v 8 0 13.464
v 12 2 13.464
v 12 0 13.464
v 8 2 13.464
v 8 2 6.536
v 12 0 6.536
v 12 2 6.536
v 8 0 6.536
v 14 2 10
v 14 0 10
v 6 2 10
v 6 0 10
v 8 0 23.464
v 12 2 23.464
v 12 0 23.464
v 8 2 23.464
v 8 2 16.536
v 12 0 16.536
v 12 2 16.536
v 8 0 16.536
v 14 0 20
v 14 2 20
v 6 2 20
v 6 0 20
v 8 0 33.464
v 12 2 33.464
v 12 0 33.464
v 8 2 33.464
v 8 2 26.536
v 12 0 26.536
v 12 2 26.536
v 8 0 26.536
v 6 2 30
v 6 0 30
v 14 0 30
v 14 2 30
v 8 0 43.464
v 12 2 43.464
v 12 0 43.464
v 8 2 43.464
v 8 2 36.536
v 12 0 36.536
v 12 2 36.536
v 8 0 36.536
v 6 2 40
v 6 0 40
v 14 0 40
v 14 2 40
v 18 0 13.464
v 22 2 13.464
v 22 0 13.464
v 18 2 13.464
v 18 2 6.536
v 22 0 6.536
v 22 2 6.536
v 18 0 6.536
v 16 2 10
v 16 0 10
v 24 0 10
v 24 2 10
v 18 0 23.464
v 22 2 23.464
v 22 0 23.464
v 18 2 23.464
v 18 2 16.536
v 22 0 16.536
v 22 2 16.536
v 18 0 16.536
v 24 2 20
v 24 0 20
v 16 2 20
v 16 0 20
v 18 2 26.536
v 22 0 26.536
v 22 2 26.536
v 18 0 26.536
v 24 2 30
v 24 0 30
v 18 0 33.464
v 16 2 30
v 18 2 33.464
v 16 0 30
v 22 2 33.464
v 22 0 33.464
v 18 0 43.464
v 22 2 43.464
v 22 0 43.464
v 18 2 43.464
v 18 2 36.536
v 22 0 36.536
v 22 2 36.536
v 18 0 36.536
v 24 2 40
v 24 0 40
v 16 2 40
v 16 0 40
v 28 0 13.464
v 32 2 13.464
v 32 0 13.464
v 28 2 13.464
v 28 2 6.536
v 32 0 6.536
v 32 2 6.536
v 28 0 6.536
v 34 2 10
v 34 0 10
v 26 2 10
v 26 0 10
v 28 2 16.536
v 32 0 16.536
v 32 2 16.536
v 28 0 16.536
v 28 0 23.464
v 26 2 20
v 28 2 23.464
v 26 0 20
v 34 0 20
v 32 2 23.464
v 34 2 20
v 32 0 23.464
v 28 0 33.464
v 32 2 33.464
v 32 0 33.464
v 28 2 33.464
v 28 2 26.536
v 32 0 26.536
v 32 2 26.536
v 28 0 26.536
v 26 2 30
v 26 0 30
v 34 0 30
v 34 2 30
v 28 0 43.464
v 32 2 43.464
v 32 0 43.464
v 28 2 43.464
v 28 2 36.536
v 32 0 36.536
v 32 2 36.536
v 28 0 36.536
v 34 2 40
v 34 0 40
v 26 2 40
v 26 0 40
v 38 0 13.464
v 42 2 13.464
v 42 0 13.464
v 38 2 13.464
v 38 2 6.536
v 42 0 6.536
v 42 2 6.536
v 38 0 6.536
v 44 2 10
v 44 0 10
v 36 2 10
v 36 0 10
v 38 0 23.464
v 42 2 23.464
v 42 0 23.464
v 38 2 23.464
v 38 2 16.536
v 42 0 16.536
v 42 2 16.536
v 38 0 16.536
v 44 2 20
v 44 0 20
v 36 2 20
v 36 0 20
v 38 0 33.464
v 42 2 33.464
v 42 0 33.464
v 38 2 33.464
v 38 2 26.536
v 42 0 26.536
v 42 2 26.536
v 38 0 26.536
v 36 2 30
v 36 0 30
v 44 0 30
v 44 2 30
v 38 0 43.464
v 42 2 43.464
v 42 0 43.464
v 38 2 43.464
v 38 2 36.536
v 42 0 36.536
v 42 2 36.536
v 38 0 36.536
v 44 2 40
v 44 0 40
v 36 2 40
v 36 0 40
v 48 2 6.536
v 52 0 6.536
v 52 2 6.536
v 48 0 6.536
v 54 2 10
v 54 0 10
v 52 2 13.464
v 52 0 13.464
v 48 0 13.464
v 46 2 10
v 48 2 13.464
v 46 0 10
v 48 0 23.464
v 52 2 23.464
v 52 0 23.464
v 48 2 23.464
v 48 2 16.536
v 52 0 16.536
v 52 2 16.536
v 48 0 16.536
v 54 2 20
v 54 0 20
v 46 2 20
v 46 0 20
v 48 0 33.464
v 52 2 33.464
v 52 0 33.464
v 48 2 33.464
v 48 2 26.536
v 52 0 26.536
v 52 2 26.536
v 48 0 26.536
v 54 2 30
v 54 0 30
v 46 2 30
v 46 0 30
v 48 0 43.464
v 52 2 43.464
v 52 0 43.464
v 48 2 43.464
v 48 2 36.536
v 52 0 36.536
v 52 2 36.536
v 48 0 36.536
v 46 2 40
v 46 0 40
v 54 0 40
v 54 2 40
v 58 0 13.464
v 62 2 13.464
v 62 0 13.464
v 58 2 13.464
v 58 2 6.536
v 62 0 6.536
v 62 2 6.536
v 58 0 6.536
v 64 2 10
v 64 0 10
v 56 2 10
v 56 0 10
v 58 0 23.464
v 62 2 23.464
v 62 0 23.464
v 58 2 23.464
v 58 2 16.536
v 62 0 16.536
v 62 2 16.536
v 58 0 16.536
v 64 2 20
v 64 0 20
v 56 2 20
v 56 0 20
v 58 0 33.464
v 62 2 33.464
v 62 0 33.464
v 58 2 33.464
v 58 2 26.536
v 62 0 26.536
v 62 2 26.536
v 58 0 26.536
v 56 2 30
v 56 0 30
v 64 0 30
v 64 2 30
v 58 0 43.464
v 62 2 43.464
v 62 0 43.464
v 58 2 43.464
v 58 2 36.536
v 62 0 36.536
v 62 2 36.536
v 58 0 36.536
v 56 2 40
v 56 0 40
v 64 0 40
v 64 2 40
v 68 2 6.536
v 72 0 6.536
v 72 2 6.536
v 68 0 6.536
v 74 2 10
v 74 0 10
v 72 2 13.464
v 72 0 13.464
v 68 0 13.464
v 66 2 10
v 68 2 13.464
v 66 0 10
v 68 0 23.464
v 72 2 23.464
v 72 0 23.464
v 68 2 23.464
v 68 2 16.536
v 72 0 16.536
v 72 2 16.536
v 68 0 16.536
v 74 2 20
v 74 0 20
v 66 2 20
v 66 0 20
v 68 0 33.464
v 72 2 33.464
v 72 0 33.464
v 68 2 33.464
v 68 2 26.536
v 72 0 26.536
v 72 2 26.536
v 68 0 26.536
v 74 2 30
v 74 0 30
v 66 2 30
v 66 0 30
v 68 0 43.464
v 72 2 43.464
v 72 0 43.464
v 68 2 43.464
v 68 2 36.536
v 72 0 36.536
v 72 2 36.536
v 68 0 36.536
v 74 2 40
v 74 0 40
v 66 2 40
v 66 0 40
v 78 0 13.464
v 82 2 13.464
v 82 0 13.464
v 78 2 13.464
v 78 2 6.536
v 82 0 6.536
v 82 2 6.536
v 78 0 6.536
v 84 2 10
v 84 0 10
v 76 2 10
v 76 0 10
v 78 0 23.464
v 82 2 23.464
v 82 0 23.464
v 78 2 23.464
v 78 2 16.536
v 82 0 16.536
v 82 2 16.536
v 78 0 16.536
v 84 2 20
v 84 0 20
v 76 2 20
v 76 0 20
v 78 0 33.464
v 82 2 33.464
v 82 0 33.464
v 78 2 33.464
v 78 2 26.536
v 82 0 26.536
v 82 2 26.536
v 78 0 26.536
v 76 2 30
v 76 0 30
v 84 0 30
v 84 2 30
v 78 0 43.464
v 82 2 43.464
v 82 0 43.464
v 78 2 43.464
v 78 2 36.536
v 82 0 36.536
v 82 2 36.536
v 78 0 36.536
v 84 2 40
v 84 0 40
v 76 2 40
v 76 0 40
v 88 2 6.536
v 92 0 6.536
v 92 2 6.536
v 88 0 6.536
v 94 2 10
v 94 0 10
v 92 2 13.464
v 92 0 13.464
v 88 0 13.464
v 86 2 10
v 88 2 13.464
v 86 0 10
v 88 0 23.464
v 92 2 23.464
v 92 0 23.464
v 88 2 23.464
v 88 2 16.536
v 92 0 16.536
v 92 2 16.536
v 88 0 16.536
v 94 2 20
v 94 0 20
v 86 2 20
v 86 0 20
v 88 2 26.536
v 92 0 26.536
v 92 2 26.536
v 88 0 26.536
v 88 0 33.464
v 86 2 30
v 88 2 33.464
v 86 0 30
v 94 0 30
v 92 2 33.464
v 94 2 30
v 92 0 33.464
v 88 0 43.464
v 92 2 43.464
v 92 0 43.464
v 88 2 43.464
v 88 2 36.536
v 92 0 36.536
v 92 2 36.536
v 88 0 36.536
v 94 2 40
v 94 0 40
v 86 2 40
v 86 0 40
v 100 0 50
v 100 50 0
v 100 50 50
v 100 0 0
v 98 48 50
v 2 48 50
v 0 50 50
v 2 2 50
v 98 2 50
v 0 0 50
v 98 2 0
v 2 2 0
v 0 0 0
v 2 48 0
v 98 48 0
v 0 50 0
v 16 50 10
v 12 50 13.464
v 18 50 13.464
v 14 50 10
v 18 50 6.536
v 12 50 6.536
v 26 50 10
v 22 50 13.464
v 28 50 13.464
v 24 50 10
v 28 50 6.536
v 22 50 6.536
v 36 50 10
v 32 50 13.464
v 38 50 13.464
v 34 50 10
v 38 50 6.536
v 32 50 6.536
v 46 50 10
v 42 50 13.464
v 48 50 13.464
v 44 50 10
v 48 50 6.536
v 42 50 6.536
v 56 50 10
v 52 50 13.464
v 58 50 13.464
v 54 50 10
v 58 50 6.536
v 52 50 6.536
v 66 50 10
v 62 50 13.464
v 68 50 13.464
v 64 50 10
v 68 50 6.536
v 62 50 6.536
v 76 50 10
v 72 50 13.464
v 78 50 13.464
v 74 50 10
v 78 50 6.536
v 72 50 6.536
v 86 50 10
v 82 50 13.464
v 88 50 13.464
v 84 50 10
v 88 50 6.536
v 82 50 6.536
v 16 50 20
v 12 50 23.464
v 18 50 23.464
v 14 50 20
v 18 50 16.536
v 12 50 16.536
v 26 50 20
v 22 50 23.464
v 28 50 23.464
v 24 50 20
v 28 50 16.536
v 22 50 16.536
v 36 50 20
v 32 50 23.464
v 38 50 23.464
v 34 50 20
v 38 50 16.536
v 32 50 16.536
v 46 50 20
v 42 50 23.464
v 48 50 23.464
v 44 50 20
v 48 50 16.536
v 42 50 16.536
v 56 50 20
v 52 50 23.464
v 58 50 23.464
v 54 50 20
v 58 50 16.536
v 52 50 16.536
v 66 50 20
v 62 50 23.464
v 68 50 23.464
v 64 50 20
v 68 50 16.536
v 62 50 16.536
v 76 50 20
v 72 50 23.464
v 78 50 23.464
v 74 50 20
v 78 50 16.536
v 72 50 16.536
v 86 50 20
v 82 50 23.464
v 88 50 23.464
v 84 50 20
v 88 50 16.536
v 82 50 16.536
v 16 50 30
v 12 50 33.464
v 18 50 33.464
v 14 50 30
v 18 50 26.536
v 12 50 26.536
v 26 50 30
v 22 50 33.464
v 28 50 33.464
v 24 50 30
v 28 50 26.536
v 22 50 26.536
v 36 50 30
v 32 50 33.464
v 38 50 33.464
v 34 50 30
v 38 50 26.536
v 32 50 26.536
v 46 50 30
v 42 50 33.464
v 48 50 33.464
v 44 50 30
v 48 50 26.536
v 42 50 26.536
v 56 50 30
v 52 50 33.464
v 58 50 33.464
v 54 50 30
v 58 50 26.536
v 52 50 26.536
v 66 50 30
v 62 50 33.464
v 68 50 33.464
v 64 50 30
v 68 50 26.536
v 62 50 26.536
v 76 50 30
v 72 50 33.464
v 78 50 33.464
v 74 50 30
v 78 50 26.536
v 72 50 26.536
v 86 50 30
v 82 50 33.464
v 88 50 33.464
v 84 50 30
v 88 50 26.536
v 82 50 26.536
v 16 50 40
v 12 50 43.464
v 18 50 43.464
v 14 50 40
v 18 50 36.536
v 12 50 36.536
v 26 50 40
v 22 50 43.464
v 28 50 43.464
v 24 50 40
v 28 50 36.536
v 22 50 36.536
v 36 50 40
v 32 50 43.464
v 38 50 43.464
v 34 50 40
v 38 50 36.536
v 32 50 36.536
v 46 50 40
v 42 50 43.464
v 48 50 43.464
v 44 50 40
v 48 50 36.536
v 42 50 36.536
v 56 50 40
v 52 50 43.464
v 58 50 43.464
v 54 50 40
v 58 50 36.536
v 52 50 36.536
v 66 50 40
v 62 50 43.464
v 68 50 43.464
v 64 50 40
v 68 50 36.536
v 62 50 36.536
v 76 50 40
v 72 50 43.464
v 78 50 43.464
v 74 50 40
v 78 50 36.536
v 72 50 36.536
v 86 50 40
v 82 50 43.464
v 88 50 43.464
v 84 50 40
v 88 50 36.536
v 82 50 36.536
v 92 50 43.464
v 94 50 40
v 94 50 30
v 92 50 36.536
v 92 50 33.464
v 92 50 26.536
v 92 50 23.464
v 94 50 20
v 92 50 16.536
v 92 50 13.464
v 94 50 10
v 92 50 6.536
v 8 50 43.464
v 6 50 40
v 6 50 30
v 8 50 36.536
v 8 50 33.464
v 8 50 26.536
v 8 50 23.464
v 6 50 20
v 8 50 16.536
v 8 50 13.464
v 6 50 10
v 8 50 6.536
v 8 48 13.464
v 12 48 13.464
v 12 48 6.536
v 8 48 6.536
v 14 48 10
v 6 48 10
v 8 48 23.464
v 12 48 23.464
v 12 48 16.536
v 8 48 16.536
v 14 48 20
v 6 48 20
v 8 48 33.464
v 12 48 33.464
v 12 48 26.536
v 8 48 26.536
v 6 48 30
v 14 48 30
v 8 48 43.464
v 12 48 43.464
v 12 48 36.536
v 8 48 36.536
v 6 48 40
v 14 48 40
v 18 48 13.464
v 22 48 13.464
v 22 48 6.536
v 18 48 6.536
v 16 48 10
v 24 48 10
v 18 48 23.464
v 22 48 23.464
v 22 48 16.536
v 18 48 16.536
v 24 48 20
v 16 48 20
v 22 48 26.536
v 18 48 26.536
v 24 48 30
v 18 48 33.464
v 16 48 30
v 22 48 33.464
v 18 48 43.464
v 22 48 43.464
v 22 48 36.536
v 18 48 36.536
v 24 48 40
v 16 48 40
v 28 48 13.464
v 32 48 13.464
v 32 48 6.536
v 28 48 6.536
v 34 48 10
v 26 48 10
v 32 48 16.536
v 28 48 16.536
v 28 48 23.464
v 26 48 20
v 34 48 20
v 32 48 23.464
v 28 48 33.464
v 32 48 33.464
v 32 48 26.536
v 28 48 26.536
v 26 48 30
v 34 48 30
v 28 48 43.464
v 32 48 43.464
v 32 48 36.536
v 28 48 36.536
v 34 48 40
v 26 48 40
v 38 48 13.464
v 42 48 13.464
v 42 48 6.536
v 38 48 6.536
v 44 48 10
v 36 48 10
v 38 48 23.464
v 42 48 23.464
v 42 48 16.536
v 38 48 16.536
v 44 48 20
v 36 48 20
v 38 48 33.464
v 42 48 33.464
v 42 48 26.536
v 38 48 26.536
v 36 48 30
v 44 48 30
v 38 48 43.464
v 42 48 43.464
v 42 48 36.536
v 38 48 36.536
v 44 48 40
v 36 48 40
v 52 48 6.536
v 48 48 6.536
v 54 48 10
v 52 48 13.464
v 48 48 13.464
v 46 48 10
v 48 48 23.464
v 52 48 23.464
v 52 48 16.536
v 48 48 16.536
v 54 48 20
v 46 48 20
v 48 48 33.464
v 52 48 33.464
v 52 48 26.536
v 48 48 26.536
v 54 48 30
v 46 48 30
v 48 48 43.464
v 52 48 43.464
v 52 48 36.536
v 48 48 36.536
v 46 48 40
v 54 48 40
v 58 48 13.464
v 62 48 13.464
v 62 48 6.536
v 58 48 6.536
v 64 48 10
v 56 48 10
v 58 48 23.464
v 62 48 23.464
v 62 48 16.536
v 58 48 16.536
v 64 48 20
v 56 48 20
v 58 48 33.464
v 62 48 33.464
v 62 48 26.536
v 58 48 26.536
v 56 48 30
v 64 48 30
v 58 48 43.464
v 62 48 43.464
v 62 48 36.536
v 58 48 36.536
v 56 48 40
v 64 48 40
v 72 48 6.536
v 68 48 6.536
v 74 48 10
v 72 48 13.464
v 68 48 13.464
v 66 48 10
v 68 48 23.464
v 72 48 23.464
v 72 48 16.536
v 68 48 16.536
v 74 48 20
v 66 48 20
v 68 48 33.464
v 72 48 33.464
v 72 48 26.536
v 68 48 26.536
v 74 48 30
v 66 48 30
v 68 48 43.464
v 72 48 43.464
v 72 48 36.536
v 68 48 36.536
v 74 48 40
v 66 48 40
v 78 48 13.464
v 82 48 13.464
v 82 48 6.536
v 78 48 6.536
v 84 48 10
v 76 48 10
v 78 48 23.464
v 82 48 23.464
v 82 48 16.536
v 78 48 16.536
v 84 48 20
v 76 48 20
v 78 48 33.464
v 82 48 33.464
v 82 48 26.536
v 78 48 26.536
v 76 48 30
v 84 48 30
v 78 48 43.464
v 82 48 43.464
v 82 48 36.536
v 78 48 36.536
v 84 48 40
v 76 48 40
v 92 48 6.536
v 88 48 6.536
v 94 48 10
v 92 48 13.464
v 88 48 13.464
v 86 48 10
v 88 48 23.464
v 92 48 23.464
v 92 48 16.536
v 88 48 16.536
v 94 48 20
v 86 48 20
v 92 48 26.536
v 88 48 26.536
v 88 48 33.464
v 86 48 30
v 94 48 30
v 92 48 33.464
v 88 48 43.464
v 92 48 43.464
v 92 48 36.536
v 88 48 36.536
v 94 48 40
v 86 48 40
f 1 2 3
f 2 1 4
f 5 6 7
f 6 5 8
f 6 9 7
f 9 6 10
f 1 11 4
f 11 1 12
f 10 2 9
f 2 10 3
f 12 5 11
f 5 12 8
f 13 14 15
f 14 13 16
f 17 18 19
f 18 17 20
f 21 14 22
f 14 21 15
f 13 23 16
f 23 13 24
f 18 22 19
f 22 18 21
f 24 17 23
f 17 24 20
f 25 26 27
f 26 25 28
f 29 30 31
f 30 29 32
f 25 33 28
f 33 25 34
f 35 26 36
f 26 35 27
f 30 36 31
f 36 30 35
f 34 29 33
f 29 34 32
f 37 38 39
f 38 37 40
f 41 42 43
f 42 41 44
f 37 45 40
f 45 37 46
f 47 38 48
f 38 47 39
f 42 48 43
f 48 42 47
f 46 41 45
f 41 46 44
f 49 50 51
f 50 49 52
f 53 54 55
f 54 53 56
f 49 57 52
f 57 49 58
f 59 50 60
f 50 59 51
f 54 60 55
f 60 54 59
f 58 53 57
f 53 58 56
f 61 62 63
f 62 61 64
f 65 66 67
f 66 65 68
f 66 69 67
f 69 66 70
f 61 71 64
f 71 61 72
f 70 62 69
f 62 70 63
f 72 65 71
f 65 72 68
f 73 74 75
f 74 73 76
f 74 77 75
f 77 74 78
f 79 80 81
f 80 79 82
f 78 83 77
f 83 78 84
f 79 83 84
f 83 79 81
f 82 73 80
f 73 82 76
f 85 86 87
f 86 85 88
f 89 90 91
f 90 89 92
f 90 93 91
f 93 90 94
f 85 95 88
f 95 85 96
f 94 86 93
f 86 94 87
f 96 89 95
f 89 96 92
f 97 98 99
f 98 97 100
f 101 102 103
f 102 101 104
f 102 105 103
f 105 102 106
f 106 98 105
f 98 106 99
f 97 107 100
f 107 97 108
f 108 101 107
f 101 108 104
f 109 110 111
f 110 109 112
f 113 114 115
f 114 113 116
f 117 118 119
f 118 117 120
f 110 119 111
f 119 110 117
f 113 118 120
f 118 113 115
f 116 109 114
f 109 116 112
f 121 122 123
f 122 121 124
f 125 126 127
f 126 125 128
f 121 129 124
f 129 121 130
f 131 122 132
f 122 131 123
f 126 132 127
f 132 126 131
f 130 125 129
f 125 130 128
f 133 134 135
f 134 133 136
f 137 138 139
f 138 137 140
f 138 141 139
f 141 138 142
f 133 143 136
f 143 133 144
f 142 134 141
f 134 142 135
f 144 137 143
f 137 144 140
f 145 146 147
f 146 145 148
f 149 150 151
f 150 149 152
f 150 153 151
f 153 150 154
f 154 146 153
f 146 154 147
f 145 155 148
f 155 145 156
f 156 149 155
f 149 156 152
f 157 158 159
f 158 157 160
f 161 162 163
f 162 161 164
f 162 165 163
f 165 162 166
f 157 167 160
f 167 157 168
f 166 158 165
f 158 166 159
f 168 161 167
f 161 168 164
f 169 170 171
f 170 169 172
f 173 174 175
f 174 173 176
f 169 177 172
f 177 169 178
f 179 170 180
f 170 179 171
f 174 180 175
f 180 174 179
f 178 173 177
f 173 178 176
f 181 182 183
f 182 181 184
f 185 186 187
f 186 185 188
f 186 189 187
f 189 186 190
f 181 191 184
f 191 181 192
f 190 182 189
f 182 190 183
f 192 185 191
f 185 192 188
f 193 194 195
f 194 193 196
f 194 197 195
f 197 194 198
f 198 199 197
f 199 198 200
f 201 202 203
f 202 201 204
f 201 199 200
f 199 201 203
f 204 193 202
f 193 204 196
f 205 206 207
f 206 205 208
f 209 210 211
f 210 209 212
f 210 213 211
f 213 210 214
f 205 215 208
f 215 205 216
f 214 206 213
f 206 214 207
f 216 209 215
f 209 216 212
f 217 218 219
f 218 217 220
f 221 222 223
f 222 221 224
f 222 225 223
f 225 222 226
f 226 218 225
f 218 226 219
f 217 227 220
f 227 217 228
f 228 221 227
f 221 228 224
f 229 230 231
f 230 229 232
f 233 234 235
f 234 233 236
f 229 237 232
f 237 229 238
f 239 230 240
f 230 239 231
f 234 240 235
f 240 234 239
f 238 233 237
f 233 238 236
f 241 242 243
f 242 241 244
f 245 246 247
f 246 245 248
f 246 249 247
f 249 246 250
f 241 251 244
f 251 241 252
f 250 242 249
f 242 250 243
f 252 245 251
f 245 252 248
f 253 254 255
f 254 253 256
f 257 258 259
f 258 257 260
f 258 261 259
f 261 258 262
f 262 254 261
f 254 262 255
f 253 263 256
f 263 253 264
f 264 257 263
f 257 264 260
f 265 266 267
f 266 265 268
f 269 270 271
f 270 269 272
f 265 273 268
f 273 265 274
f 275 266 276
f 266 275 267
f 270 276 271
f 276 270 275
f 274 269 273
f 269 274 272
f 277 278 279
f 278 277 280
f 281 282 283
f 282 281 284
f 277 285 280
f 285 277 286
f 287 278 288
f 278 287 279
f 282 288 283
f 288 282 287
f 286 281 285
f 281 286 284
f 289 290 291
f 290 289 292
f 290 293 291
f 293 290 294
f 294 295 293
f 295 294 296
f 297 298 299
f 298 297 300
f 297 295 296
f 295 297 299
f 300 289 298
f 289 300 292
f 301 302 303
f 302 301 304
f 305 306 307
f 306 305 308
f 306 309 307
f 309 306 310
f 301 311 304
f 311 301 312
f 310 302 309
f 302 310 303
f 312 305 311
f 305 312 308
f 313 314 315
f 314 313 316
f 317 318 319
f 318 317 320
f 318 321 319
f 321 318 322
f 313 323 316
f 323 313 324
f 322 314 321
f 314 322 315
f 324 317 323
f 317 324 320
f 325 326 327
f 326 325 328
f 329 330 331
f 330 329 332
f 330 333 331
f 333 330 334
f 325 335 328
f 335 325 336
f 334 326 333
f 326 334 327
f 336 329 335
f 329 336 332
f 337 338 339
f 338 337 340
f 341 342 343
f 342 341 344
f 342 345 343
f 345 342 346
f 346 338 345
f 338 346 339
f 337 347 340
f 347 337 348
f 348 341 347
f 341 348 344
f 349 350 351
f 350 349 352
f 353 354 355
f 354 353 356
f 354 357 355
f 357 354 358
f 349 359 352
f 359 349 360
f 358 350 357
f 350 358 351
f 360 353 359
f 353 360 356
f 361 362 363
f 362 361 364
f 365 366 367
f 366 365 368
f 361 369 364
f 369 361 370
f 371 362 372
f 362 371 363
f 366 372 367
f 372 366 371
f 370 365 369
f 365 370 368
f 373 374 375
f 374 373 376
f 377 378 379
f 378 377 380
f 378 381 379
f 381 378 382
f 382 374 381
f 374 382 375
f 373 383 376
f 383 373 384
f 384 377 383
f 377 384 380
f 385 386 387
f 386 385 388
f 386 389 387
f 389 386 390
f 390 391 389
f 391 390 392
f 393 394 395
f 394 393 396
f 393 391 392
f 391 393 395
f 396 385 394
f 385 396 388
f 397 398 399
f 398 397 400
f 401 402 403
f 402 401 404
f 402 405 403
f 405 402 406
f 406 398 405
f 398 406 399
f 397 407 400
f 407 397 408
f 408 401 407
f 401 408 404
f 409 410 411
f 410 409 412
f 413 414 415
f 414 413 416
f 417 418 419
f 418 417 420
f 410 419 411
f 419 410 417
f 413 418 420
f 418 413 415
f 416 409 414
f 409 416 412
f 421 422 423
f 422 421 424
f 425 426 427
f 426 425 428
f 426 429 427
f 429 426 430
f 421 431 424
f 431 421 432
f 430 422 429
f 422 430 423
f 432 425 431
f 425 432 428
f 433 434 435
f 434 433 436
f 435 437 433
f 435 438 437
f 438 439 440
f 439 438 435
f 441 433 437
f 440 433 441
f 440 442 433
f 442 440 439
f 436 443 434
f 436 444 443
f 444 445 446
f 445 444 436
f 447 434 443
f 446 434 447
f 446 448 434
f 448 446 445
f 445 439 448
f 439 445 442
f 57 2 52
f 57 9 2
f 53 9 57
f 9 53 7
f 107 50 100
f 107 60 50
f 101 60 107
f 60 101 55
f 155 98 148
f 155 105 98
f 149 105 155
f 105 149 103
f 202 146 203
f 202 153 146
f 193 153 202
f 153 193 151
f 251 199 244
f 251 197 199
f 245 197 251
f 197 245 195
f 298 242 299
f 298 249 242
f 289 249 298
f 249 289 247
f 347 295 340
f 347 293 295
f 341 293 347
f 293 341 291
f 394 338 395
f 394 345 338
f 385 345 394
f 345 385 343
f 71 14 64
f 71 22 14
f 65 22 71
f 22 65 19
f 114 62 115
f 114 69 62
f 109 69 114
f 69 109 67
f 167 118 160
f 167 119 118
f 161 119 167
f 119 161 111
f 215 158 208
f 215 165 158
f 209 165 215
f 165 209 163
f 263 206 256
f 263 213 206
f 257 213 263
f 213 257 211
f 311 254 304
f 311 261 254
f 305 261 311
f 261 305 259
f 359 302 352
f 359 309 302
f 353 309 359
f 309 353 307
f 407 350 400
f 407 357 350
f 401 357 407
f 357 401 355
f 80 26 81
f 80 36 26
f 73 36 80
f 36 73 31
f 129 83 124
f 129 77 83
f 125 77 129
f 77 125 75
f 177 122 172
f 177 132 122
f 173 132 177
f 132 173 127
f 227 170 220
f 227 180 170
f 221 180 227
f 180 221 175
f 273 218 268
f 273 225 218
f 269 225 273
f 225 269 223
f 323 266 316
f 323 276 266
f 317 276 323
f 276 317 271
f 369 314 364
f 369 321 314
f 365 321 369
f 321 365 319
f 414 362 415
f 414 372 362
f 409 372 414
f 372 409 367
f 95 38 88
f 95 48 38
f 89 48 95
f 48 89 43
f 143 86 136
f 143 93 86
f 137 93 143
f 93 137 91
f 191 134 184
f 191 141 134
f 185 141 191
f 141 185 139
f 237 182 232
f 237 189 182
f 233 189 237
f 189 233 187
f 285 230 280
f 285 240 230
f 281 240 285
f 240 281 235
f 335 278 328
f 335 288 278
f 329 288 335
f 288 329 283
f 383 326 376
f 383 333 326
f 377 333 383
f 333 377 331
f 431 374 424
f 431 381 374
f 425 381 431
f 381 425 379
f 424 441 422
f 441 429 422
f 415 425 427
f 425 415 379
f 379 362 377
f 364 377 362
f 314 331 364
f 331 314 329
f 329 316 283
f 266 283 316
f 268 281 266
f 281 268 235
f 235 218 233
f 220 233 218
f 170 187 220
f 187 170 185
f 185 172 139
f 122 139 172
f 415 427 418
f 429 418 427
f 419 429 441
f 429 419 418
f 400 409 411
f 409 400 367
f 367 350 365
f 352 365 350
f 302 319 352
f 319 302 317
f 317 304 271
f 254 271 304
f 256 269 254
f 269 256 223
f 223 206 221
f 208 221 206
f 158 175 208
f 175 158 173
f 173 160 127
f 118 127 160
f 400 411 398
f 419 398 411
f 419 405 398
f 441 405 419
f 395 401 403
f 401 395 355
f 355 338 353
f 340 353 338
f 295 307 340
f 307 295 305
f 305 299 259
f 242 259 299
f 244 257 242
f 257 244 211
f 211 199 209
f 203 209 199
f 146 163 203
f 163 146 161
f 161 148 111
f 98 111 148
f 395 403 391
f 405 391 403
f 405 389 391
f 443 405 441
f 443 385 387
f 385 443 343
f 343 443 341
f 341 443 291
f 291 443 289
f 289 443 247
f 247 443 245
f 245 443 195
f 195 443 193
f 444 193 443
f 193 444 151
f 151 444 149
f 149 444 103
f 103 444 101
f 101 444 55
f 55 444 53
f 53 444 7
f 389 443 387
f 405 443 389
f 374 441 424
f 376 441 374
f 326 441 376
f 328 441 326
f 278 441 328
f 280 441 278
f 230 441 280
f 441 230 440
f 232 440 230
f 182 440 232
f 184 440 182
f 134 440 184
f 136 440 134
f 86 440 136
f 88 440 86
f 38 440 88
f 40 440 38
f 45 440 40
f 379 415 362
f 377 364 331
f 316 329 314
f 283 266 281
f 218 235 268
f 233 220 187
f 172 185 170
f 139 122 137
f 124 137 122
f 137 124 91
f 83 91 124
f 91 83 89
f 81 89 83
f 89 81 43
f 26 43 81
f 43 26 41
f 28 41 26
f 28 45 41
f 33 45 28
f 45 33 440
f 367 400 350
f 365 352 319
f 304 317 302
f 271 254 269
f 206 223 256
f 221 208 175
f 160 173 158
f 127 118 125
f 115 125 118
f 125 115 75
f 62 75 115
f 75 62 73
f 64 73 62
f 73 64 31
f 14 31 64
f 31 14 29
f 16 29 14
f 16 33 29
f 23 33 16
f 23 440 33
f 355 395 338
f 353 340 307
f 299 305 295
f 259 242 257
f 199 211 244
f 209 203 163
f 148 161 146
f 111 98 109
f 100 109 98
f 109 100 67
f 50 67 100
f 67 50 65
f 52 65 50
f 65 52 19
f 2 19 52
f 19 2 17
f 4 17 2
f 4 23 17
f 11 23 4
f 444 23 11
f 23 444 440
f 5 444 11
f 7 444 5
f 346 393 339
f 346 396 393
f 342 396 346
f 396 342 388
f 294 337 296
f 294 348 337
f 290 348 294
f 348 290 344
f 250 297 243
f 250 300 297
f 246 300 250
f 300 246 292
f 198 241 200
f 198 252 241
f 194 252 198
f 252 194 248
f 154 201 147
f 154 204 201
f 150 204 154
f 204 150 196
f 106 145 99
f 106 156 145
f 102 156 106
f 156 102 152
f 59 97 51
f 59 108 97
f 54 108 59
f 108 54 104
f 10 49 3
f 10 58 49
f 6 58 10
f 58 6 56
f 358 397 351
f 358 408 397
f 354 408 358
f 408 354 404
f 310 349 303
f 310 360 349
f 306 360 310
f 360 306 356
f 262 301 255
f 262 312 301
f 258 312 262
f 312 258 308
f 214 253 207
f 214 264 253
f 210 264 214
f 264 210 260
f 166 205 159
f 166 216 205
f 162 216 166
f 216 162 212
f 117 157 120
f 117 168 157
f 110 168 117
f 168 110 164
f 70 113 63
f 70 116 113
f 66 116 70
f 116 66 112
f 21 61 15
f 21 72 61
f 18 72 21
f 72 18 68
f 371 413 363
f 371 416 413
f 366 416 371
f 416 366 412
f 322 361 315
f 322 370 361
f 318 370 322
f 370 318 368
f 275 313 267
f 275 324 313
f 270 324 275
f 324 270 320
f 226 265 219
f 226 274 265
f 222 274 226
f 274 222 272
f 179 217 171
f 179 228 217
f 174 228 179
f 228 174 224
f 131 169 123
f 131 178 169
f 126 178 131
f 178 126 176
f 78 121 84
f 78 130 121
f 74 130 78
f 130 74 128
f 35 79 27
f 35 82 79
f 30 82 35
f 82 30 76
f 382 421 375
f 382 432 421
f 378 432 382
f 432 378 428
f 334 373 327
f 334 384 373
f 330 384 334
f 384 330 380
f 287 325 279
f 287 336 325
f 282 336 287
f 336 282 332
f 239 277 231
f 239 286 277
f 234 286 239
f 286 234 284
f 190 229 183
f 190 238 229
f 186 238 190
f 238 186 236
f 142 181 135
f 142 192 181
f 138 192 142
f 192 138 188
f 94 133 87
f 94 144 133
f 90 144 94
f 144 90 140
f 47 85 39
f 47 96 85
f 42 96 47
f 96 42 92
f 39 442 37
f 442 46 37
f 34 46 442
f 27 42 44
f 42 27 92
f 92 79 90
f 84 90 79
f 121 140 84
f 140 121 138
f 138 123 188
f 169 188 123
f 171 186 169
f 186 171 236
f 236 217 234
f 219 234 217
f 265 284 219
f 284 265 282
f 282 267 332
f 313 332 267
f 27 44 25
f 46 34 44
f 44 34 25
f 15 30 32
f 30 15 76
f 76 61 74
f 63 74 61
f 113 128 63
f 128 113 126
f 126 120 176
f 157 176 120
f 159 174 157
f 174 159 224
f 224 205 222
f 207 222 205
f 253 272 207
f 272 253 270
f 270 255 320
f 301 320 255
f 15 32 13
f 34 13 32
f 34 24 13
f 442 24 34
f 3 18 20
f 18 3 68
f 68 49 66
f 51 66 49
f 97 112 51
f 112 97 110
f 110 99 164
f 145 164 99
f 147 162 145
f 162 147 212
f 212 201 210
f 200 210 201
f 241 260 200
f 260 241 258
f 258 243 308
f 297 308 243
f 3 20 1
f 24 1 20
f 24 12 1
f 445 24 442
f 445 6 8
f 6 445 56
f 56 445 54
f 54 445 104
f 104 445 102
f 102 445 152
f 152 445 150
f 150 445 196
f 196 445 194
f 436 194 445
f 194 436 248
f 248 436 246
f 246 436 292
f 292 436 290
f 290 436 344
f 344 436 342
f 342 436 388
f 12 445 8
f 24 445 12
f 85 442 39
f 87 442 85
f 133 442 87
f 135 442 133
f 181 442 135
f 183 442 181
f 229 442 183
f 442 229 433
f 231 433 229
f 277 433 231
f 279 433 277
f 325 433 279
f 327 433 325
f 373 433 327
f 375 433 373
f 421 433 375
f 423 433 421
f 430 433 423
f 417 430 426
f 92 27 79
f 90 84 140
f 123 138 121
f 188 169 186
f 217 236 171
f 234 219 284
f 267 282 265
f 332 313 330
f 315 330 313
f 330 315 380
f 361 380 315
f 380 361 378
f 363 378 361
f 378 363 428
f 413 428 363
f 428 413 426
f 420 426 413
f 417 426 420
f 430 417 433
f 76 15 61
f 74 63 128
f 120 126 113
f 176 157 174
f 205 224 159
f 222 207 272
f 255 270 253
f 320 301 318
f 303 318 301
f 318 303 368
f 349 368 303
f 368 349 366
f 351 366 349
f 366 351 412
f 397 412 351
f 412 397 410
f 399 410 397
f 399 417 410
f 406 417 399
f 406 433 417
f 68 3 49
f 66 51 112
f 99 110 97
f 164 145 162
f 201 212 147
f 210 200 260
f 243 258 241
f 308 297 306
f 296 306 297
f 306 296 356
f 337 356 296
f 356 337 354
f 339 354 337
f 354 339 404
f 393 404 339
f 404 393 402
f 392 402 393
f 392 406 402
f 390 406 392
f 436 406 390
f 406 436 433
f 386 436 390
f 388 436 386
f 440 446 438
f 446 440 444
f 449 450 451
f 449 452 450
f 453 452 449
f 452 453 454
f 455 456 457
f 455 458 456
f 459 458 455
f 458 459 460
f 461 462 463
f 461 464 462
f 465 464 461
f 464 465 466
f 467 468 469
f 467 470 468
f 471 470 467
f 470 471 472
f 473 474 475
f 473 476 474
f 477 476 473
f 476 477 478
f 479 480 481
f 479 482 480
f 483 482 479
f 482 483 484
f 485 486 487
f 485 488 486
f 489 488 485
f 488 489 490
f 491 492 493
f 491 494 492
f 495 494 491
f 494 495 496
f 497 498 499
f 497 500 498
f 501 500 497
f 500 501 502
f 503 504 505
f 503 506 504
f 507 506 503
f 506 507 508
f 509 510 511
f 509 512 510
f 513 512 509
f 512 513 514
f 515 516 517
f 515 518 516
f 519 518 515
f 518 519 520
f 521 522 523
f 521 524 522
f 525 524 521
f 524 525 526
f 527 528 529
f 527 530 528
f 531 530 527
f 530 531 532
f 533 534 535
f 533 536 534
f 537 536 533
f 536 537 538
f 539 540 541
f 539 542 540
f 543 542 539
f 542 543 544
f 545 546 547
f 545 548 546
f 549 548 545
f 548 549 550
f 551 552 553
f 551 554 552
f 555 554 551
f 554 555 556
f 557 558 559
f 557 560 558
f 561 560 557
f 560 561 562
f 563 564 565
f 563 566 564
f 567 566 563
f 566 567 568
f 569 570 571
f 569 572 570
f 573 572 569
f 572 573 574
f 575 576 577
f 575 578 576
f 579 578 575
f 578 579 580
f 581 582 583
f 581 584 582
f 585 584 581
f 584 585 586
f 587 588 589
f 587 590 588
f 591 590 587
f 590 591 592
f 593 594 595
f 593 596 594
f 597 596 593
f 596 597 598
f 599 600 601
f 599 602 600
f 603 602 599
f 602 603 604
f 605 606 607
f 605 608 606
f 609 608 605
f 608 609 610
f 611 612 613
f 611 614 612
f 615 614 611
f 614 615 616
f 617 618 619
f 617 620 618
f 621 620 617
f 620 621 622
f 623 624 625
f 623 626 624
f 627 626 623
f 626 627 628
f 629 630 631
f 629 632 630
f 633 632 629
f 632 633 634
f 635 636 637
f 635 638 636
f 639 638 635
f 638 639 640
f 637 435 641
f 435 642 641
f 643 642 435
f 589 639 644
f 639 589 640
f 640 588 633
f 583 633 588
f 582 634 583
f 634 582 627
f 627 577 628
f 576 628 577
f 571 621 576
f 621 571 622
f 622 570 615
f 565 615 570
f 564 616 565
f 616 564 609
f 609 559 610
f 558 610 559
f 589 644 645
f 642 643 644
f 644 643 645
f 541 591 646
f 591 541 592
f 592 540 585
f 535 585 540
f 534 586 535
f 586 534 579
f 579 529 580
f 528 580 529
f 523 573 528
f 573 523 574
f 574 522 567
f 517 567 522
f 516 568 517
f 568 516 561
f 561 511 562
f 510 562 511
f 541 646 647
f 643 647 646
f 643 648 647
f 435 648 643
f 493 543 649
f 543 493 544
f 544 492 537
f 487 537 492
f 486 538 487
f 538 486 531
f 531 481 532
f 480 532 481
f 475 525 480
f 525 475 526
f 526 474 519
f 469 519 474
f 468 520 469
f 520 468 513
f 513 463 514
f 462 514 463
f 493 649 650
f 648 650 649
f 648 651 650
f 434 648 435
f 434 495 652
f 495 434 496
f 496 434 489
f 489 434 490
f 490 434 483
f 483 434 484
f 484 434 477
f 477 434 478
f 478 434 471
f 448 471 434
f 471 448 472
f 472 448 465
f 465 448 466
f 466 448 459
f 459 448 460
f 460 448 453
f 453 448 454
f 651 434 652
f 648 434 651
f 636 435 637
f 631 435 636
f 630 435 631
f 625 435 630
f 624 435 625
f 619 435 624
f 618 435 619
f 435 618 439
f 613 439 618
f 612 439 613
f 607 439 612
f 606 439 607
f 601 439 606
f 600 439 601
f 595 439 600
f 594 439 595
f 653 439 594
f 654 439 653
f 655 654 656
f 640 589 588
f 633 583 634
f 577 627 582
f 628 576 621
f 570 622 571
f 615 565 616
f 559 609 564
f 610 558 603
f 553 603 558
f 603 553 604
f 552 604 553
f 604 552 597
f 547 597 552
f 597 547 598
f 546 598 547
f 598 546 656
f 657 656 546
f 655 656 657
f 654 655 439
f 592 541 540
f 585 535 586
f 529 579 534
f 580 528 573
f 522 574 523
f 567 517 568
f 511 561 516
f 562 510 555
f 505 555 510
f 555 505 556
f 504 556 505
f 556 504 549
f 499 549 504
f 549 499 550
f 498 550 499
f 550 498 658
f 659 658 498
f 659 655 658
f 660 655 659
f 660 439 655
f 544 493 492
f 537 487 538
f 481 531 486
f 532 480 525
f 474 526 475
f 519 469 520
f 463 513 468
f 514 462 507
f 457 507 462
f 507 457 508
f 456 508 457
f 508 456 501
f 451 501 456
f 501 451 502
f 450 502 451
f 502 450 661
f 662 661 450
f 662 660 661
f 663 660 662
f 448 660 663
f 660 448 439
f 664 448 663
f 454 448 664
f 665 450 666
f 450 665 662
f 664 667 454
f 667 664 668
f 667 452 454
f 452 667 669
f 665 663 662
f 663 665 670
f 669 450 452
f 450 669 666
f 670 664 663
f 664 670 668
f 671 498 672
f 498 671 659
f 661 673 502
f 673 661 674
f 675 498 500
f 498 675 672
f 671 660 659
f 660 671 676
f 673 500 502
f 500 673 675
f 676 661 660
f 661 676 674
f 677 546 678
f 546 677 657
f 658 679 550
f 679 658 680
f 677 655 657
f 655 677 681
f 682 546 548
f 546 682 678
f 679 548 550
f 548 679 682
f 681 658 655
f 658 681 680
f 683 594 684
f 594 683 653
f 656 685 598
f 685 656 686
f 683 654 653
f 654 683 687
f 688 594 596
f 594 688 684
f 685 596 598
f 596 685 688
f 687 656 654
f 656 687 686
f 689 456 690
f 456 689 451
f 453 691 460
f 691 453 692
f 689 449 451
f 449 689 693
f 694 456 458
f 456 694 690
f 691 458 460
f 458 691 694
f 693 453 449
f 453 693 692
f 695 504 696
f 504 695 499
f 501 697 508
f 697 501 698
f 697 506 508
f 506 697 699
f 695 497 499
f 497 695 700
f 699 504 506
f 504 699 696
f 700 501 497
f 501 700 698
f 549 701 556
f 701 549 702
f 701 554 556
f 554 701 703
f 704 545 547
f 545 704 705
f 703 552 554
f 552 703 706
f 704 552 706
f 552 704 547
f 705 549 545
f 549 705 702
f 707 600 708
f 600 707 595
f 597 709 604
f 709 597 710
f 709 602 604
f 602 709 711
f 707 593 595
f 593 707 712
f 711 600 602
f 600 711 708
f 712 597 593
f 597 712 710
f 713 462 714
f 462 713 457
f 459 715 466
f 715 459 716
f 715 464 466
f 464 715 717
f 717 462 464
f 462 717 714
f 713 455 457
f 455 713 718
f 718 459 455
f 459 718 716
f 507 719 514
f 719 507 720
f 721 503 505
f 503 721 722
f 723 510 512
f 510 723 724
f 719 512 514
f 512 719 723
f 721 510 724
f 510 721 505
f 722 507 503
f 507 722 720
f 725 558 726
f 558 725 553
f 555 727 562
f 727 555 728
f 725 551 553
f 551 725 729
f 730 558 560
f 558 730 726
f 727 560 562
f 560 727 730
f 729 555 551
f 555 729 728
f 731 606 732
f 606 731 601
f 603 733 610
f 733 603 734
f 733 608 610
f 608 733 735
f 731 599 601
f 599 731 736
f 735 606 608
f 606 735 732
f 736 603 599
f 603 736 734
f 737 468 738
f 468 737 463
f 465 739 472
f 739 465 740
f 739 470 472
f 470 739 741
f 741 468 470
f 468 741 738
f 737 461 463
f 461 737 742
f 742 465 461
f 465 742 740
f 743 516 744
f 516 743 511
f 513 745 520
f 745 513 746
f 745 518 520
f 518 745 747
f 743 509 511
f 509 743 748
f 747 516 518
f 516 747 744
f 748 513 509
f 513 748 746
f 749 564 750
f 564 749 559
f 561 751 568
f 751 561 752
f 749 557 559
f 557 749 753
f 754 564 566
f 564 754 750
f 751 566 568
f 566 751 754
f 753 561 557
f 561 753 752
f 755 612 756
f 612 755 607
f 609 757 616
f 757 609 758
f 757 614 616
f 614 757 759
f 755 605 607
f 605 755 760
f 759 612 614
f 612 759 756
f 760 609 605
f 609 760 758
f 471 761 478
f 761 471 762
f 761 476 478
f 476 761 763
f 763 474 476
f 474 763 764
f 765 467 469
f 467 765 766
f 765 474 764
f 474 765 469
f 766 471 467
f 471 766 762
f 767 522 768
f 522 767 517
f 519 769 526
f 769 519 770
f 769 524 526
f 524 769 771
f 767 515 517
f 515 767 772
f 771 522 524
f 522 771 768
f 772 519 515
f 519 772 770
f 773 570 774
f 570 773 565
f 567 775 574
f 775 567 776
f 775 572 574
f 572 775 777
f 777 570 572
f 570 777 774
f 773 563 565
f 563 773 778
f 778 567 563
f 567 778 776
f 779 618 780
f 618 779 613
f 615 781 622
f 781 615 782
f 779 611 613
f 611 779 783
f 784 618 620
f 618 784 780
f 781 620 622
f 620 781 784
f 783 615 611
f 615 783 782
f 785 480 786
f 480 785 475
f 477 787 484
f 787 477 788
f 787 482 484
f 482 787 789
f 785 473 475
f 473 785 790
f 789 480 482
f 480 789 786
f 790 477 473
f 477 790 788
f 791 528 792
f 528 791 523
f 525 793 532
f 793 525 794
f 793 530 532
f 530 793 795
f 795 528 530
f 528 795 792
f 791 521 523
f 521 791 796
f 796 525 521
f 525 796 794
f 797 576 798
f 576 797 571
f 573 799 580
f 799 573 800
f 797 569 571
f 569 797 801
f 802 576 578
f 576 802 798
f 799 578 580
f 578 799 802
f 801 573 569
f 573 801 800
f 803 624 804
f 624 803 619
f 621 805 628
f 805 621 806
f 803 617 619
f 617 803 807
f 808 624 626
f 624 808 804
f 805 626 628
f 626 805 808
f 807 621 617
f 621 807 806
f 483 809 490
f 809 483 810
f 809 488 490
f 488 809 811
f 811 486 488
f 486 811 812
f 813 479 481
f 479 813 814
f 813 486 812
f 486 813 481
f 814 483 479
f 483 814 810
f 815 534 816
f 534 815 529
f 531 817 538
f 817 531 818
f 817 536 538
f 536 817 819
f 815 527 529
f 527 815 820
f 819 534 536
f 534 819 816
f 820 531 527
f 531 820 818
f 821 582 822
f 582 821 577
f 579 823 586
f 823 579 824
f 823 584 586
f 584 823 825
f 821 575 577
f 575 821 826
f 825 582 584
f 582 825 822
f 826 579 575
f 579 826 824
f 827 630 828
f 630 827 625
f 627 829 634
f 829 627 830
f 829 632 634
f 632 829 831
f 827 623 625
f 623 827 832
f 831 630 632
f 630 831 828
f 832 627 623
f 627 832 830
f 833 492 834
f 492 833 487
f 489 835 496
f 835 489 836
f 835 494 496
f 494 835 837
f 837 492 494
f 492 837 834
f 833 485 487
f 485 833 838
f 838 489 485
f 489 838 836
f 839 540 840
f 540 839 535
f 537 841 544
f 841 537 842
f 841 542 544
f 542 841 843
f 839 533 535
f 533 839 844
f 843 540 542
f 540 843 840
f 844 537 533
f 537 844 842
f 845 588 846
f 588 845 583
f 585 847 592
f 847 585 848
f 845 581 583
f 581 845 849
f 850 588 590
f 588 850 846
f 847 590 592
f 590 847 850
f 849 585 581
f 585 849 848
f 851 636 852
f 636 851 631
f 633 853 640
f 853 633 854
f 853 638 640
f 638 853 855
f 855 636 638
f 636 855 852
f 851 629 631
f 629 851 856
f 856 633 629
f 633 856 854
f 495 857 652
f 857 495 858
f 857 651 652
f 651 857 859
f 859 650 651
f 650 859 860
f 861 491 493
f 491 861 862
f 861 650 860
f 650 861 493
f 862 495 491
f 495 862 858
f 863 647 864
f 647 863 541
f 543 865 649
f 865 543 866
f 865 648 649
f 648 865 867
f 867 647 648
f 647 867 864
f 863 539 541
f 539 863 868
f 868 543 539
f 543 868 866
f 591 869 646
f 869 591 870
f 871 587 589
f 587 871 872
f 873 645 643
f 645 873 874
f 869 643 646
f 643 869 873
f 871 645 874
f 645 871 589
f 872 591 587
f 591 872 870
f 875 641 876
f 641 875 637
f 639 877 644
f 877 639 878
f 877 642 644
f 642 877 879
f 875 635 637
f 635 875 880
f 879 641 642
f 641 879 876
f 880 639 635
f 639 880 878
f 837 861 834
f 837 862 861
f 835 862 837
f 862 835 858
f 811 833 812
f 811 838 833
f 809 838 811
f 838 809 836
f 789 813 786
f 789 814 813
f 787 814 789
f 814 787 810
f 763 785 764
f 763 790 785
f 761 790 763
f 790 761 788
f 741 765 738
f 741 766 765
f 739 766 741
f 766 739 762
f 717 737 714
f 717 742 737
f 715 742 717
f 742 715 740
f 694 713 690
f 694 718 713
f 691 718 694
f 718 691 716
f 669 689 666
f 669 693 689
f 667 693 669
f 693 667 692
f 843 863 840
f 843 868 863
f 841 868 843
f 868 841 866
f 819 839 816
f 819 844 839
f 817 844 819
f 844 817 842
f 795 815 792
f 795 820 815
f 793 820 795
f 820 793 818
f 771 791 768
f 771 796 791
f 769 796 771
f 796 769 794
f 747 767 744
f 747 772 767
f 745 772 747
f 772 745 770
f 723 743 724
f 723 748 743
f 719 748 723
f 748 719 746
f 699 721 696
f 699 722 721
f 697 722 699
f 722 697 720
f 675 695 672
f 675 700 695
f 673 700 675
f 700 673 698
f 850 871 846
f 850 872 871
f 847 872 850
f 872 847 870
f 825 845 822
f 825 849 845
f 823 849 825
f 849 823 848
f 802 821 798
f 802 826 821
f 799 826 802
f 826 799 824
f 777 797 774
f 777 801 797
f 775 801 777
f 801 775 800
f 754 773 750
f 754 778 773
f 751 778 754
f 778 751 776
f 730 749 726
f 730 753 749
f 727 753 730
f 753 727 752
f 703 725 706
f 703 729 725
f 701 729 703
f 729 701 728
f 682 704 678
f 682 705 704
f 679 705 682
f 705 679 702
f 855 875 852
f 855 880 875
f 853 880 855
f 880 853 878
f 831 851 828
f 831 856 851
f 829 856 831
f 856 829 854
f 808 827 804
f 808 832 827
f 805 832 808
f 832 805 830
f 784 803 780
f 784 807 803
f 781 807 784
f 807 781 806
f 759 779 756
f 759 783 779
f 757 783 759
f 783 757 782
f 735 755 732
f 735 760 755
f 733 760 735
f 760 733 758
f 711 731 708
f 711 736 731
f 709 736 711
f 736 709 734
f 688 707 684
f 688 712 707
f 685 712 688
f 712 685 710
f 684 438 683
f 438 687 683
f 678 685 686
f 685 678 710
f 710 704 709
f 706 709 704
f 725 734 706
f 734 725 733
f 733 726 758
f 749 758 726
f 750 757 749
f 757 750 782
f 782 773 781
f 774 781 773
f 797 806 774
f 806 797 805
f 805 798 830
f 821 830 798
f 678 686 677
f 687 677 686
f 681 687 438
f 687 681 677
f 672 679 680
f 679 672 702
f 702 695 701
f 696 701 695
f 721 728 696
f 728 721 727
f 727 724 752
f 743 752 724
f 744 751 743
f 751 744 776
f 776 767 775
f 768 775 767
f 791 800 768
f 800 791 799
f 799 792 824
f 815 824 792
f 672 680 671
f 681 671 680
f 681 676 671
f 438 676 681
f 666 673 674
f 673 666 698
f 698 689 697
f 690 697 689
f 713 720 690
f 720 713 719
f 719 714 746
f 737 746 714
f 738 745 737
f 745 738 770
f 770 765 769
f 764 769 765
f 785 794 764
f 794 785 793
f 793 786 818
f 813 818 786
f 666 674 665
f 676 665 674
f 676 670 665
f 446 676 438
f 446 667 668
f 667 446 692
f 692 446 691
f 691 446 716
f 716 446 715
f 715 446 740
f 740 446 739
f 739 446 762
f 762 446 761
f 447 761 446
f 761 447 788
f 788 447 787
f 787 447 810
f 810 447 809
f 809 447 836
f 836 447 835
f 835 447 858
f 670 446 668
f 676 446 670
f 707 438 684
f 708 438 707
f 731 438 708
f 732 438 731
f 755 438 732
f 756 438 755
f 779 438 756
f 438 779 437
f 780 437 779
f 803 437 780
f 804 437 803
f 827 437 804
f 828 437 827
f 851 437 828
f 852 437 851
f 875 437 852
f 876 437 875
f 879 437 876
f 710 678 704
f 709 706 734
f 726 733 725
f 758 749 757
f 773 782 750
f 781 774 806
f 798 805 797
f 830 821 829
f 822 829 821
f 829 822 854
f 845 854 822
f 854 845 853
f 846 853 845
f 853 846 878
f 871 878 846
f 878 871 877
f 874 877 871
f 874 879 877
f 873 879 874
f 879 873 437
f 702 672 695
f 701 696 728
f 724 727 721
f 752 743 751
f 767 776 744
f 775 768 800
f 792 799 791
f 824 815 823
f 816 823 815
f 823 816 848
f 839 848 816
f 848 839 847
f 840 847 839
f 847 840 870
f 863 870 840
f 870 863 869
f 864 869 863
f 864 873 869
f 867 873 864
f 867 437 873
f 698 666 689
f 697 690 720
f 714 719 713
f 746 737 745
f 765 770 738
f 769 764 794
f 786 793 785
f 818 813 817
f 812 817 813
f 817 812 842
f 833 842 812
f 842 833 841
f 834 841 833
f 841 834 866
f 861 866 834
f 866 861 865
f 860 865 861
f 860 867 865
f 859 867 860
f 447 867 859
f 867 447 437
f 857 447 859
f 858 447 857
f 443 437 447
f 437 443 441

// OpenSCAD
// Parameters
wall_thick = 2;
box_x = 100;
box_y = 50;
box_z = 50;
hole_dia = 8;
spacing = 10;

module hex_hole() {
    rotate([0, 0, 30])
    circle(d=hole_dia, $fn=6); // $fn=6 makes a hexagon
}

module patterned_side(wallLength, wallThinkness, wallHeight) {
    difference() {
        // The Solid Side
        cube([wallLength, wallThinkness, wallHeight]);
        
        // Subtract holes
        for (x = [spacing : spacing : box_x - spacing]) {
//            echo("x=",x);
            for (z = [spacing : spacing : box_z - spacing]) {
//                echo("z=",z);
// Perforatie langs de X-as
                translate([x, -1, z])
                    rotate([0, 90, 90])
                        linear_extrude(wall_thick + 10)
                            hex_hole();
//// Perforatie langs de Y-as
//                translate([-1, x, z])
//                    rotate([90, 0, 90])
//                        linear_extrude(wall_thick + 10)
//                            hex_hole();
            }
        }
    }
}

// Position the side
patterned_side(box_x, wall_thick, box_z);
translate([0,box_y,0])
    rotate([90,0,0])
        patterned_side(wall_thick, box_y, box_z);
translate([0,box_y-wall_thick,0])
    patterned_side(box_x, wall_thick, box_z);
translate([box_x-wall_thick,box_y,0])
    rotate([90,0,0])
        patterned_side(wall_thick, box_y, box_z);
